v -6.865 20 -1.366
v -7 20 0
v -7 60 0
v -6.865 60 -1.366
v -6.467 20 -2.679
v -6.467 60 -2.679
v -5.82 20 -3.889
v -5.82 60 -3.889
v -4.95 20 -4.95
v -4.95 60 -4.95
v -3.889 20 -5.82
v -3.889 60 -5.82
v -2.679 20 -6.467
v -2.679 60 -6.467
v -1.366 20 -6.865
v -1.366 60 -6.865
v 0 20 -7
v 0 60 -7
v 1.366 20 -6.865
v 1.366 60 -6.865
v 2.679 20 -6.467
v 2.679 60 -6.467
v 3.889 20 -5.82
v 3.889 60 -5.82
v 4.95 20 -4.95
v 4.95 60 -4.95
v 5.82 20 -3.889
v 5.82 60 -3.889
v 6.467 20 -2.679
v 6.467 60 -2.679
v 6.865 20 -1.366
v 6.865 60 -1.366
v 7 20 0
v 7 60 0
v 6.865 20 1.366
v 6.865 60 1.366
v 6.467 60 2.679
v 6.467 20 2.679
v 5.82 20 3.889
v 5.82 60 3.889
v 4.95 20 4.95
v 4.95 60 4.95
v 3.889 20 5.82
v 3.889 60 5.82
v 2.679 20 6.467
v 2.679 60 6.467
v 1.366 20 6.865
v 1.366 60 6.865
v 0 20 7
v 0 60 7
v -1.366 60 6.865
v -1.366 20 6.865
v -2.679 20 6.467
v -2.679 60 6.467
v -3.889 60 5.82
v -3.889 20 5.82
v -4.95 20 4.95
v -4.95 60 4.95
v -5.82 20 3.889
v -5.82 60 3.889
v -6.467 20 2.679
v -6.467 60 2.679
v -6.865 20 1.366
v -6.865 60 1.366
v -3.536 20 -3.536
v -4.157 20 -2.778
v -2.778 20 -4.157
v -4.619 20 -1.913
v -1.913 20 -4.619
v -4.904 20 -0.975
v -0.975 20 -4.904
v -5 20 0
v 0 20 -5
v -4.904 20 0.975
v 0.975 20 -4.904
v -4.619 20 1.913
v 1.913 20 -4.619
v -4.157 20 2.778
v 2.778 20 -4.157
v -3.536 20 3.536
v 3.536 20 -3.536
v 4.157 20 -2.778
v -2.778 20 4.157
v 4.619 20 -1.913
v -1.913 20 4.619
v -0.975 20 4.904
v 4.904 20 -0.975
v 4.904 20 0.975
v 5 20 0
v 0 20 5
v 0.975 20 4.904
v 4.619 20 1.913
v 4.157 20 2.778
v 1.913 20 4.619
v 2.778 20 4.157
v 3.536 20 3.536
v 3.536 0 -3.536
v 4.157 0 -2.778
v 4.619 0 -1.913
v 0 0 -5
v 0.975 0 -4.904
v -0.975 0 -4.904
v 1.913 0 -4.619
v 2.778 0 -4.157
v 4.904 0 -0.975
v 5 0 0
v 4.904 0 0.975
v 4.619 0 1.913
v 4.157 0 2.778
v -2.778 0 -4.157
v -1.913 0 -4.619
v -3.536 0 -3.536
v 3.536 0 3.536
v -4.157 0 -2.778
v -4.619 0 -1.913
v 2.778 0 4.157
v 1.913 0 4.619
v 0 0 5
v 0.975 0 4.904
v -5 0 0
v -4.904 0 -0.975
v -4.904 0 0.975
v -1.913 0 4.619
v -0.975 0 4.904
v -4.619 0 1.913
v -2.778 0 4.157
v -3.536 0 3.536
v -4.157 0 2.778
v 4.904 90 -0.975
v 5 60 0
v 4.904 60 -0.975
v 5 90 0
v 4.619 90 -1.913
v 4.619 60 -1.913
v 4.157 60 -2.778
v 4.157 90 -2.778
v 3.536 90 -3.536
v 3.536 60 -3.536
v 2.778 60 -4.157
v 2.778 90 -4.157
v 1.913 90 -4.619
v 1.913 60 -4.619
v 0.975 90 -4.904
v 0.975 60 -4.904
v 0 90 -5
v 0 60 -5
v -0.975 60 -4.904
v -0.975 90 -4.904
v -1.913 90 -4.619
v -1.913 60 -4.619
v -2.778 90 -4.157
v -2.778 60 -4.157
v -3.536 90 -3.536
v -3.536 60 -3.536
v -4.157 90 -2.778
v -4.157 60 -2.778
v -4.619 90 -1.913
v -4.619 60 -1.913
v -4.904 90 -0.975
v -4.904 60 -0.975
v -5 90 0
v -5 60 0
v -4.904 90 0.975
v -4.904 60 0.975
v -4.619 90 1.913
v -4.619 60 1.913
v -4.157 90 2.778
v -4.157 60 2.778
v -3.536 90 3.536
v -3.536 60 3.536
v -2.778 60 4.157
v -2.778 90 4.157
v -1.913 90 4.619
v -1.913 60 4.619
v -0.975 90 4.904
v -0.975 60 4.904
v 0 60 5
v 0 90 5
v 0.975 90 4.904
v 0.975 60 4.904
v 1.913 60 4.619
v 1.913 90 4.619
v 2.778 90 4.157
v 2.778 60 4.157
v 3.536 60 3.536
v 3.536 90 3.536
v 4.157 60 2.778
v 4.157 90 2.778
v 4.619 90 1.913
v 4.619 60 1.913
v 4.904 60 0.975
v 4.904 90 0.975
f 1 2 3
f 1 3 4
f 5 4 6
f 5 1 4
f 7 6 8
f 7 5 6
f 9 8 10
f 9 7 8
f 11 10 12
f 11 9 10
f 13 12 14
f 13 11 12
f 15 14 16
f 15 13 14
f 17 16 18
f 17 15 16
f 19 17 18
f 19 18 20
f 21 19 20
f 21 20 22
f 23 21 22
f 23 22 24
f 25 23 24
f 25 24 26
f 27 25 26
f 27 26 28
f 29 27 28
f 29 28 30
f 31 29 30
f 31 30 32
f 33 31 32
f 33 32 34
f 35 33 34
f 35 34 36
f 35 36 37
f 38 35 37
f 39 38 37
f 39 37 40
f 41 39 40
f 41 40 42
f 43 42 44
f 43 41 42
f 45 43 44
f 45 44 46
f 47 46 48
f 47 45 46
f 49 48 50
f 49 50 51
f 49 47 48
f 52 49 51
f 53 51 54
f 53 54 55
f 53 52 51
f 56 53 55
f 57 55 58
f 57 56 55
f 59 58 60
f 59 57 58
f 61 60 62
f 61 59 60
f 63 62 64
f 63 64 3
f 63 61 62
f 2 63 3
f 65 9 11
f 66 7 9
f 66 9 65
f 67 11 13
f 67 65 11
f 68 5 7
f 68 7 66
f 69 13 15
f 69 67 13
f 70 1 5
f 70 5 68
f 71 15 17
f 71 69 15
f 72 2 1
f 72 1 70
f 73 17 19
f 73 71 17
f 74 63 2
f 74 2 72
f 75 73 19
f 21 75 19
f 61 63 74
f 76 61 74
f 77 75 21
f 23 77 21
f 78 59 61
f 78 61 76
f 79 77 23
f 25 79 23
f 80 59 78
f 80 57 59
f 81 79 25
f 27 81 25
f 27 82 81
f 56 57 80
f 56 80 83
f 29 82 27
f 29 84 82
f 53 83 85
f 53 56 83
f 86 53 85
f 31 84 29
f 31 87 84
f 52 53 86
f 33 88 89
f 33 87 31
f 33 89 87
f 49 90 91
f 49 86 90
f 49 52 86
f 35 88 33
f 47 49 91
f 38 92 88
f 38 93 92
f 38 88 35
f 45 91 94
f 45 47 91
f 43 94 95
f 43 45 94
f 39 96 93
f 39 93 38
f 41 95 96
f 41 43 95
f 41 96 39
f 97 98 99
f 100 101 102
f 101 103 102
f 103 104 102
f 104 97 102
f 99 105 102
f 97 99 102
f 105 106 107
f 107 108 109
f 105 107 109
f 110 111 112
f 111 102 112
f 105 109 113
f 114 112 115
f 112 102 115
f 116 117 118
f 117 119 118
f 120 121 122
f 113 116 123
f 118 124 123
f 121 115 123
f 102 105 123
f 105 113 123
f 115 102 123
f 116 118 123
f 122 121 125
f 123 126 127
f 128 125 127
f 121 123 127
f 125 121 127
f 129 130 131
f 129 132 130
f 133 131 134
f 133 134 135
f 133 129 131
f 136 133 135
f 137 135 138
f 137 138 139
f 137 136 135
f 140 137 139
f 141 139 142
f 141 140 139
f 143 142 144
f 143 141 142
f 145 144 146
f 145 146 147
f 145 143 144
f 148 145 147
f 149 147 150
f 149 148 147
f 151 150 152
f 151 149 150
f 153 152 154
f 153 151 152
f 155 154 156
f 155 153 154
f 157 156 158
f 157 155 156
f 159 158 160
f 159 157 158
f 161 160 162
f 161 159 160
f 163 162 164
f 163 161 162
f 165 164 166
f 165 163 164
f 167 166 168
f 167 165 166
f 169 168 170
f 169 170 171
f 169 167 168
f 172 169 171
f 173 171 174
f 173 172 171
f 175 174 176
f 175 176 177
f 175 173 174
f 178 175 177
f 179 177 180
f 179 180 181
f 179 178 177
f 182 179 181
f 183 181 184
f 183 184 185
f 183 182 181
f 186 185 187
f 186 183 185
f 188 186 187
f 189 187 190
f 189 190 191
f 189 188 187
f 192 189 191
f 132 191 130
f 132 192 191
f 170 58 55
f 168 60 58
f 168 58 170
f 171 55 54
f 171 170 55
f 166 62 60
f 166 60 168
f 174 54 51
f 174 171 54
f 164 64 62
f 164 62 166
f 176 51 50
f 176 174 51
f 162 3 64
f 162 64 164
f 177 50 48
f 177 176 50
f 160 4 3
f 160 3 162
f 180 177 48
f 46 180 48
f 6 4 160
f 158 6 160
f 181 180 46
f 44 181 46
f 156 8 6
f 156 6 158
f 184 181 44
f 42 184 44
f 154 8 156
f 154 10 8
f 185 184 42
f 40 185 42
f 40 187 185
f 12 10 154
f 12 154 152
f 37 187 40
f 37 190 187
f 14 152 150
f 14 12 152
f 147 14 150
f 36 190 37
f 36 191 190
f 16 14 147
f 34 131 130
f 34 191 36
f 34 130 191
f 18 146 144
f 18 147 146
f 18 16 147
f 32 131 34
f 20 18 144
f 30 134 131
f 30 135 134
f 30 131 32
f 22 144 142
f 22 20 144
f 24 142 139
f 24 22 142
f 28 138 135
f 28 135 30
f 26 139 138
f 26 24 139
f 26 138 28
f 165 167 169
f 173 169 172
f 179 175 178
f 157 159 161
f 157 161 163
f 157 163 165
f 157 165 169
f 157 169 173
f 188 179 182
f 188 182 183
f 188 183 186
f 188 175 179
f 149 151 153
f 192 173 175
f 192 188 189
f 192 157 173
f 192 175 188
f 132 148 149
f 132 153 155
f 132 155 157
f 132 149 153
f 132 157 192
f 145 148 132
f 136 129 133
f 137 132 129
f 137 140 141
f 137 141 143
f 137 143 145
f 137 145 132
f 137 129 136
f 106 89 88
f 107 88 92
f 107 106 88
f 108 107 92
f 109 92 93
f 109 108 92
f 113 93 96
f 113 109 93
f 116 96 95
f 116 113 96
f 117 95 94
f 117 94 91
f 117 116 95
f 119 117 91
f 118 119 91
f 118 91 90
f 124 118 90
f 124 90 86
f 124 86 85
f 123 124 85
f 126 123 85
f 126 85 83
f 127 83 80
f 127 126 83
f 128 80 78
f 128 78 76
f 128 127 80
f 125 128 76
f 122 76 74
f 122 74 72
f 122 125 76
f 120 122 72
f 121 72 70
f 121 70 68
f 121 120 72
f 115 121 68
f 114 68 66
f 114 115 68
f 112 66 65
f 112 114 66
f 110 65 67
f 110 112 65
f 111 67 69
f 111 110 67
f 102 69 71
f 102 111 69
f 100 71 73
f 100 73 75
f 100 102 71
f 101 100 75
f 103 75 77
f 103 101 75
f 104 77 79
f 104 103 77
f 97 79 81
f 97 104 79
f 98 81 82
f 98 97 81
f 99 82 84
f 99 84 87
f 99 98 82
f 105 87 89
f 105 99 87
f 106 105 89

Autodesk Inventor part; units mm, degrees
ref_plane "YZ Plane" through (0, 0, 0) normal (1, 0, 0) x (0, 1, 0)
ref_plane "XZ Plane" through (0, 0, 0) normal (0, 1, 0) x (-1, 0, 0)
ref_plane "XY Plane" through (0, 0, 0) normal (0, 0, 1) x (1, 0, 0)
sketch "Sketch1" plane through (0, 0, 0) normal (0, 1, 0) x (-1, 0, 0)
  circle A0 centre (0, 0) radius 7
  dimension "d0" = 14
extrude "Extrusion1" add sketch "Sketch1" along normal blind 95
sketch "Sketch2" plane through (0, 0, 0) normal (0, -1, 0) x (1, 0, 0)
  circle A0 centre (0, 0) radius 7
  circle A1 centre (0, 0) radius 5
  dimension "d3" = 10
extrude "Extrusion2" cut sketch "Sketch2" against normal blind 20
sketch "Sketch3" plane through (0, 95, 0) normal (0, 1, 0) x (1, 0, 0)
  circle A0 centre (0, 0) radius 7
  circle A1 centre (0, 0) radius 5
  dimension "d6" = 14
  dimension "d7" = 10
extrude "Extrusion3" cut sketch "Sketch3" against normal blind 35
sketch "Sketch4" plane through (0, 95, 0) normal (0, 1, 0) x (1, 0, 0)
  circle A0 centre (0, 0) radius 5
  dimension "d10" = 10
extrude "Extrusion4" cut sketch "Sketch4" against normal blind 5
properties part number "trucj-10"
